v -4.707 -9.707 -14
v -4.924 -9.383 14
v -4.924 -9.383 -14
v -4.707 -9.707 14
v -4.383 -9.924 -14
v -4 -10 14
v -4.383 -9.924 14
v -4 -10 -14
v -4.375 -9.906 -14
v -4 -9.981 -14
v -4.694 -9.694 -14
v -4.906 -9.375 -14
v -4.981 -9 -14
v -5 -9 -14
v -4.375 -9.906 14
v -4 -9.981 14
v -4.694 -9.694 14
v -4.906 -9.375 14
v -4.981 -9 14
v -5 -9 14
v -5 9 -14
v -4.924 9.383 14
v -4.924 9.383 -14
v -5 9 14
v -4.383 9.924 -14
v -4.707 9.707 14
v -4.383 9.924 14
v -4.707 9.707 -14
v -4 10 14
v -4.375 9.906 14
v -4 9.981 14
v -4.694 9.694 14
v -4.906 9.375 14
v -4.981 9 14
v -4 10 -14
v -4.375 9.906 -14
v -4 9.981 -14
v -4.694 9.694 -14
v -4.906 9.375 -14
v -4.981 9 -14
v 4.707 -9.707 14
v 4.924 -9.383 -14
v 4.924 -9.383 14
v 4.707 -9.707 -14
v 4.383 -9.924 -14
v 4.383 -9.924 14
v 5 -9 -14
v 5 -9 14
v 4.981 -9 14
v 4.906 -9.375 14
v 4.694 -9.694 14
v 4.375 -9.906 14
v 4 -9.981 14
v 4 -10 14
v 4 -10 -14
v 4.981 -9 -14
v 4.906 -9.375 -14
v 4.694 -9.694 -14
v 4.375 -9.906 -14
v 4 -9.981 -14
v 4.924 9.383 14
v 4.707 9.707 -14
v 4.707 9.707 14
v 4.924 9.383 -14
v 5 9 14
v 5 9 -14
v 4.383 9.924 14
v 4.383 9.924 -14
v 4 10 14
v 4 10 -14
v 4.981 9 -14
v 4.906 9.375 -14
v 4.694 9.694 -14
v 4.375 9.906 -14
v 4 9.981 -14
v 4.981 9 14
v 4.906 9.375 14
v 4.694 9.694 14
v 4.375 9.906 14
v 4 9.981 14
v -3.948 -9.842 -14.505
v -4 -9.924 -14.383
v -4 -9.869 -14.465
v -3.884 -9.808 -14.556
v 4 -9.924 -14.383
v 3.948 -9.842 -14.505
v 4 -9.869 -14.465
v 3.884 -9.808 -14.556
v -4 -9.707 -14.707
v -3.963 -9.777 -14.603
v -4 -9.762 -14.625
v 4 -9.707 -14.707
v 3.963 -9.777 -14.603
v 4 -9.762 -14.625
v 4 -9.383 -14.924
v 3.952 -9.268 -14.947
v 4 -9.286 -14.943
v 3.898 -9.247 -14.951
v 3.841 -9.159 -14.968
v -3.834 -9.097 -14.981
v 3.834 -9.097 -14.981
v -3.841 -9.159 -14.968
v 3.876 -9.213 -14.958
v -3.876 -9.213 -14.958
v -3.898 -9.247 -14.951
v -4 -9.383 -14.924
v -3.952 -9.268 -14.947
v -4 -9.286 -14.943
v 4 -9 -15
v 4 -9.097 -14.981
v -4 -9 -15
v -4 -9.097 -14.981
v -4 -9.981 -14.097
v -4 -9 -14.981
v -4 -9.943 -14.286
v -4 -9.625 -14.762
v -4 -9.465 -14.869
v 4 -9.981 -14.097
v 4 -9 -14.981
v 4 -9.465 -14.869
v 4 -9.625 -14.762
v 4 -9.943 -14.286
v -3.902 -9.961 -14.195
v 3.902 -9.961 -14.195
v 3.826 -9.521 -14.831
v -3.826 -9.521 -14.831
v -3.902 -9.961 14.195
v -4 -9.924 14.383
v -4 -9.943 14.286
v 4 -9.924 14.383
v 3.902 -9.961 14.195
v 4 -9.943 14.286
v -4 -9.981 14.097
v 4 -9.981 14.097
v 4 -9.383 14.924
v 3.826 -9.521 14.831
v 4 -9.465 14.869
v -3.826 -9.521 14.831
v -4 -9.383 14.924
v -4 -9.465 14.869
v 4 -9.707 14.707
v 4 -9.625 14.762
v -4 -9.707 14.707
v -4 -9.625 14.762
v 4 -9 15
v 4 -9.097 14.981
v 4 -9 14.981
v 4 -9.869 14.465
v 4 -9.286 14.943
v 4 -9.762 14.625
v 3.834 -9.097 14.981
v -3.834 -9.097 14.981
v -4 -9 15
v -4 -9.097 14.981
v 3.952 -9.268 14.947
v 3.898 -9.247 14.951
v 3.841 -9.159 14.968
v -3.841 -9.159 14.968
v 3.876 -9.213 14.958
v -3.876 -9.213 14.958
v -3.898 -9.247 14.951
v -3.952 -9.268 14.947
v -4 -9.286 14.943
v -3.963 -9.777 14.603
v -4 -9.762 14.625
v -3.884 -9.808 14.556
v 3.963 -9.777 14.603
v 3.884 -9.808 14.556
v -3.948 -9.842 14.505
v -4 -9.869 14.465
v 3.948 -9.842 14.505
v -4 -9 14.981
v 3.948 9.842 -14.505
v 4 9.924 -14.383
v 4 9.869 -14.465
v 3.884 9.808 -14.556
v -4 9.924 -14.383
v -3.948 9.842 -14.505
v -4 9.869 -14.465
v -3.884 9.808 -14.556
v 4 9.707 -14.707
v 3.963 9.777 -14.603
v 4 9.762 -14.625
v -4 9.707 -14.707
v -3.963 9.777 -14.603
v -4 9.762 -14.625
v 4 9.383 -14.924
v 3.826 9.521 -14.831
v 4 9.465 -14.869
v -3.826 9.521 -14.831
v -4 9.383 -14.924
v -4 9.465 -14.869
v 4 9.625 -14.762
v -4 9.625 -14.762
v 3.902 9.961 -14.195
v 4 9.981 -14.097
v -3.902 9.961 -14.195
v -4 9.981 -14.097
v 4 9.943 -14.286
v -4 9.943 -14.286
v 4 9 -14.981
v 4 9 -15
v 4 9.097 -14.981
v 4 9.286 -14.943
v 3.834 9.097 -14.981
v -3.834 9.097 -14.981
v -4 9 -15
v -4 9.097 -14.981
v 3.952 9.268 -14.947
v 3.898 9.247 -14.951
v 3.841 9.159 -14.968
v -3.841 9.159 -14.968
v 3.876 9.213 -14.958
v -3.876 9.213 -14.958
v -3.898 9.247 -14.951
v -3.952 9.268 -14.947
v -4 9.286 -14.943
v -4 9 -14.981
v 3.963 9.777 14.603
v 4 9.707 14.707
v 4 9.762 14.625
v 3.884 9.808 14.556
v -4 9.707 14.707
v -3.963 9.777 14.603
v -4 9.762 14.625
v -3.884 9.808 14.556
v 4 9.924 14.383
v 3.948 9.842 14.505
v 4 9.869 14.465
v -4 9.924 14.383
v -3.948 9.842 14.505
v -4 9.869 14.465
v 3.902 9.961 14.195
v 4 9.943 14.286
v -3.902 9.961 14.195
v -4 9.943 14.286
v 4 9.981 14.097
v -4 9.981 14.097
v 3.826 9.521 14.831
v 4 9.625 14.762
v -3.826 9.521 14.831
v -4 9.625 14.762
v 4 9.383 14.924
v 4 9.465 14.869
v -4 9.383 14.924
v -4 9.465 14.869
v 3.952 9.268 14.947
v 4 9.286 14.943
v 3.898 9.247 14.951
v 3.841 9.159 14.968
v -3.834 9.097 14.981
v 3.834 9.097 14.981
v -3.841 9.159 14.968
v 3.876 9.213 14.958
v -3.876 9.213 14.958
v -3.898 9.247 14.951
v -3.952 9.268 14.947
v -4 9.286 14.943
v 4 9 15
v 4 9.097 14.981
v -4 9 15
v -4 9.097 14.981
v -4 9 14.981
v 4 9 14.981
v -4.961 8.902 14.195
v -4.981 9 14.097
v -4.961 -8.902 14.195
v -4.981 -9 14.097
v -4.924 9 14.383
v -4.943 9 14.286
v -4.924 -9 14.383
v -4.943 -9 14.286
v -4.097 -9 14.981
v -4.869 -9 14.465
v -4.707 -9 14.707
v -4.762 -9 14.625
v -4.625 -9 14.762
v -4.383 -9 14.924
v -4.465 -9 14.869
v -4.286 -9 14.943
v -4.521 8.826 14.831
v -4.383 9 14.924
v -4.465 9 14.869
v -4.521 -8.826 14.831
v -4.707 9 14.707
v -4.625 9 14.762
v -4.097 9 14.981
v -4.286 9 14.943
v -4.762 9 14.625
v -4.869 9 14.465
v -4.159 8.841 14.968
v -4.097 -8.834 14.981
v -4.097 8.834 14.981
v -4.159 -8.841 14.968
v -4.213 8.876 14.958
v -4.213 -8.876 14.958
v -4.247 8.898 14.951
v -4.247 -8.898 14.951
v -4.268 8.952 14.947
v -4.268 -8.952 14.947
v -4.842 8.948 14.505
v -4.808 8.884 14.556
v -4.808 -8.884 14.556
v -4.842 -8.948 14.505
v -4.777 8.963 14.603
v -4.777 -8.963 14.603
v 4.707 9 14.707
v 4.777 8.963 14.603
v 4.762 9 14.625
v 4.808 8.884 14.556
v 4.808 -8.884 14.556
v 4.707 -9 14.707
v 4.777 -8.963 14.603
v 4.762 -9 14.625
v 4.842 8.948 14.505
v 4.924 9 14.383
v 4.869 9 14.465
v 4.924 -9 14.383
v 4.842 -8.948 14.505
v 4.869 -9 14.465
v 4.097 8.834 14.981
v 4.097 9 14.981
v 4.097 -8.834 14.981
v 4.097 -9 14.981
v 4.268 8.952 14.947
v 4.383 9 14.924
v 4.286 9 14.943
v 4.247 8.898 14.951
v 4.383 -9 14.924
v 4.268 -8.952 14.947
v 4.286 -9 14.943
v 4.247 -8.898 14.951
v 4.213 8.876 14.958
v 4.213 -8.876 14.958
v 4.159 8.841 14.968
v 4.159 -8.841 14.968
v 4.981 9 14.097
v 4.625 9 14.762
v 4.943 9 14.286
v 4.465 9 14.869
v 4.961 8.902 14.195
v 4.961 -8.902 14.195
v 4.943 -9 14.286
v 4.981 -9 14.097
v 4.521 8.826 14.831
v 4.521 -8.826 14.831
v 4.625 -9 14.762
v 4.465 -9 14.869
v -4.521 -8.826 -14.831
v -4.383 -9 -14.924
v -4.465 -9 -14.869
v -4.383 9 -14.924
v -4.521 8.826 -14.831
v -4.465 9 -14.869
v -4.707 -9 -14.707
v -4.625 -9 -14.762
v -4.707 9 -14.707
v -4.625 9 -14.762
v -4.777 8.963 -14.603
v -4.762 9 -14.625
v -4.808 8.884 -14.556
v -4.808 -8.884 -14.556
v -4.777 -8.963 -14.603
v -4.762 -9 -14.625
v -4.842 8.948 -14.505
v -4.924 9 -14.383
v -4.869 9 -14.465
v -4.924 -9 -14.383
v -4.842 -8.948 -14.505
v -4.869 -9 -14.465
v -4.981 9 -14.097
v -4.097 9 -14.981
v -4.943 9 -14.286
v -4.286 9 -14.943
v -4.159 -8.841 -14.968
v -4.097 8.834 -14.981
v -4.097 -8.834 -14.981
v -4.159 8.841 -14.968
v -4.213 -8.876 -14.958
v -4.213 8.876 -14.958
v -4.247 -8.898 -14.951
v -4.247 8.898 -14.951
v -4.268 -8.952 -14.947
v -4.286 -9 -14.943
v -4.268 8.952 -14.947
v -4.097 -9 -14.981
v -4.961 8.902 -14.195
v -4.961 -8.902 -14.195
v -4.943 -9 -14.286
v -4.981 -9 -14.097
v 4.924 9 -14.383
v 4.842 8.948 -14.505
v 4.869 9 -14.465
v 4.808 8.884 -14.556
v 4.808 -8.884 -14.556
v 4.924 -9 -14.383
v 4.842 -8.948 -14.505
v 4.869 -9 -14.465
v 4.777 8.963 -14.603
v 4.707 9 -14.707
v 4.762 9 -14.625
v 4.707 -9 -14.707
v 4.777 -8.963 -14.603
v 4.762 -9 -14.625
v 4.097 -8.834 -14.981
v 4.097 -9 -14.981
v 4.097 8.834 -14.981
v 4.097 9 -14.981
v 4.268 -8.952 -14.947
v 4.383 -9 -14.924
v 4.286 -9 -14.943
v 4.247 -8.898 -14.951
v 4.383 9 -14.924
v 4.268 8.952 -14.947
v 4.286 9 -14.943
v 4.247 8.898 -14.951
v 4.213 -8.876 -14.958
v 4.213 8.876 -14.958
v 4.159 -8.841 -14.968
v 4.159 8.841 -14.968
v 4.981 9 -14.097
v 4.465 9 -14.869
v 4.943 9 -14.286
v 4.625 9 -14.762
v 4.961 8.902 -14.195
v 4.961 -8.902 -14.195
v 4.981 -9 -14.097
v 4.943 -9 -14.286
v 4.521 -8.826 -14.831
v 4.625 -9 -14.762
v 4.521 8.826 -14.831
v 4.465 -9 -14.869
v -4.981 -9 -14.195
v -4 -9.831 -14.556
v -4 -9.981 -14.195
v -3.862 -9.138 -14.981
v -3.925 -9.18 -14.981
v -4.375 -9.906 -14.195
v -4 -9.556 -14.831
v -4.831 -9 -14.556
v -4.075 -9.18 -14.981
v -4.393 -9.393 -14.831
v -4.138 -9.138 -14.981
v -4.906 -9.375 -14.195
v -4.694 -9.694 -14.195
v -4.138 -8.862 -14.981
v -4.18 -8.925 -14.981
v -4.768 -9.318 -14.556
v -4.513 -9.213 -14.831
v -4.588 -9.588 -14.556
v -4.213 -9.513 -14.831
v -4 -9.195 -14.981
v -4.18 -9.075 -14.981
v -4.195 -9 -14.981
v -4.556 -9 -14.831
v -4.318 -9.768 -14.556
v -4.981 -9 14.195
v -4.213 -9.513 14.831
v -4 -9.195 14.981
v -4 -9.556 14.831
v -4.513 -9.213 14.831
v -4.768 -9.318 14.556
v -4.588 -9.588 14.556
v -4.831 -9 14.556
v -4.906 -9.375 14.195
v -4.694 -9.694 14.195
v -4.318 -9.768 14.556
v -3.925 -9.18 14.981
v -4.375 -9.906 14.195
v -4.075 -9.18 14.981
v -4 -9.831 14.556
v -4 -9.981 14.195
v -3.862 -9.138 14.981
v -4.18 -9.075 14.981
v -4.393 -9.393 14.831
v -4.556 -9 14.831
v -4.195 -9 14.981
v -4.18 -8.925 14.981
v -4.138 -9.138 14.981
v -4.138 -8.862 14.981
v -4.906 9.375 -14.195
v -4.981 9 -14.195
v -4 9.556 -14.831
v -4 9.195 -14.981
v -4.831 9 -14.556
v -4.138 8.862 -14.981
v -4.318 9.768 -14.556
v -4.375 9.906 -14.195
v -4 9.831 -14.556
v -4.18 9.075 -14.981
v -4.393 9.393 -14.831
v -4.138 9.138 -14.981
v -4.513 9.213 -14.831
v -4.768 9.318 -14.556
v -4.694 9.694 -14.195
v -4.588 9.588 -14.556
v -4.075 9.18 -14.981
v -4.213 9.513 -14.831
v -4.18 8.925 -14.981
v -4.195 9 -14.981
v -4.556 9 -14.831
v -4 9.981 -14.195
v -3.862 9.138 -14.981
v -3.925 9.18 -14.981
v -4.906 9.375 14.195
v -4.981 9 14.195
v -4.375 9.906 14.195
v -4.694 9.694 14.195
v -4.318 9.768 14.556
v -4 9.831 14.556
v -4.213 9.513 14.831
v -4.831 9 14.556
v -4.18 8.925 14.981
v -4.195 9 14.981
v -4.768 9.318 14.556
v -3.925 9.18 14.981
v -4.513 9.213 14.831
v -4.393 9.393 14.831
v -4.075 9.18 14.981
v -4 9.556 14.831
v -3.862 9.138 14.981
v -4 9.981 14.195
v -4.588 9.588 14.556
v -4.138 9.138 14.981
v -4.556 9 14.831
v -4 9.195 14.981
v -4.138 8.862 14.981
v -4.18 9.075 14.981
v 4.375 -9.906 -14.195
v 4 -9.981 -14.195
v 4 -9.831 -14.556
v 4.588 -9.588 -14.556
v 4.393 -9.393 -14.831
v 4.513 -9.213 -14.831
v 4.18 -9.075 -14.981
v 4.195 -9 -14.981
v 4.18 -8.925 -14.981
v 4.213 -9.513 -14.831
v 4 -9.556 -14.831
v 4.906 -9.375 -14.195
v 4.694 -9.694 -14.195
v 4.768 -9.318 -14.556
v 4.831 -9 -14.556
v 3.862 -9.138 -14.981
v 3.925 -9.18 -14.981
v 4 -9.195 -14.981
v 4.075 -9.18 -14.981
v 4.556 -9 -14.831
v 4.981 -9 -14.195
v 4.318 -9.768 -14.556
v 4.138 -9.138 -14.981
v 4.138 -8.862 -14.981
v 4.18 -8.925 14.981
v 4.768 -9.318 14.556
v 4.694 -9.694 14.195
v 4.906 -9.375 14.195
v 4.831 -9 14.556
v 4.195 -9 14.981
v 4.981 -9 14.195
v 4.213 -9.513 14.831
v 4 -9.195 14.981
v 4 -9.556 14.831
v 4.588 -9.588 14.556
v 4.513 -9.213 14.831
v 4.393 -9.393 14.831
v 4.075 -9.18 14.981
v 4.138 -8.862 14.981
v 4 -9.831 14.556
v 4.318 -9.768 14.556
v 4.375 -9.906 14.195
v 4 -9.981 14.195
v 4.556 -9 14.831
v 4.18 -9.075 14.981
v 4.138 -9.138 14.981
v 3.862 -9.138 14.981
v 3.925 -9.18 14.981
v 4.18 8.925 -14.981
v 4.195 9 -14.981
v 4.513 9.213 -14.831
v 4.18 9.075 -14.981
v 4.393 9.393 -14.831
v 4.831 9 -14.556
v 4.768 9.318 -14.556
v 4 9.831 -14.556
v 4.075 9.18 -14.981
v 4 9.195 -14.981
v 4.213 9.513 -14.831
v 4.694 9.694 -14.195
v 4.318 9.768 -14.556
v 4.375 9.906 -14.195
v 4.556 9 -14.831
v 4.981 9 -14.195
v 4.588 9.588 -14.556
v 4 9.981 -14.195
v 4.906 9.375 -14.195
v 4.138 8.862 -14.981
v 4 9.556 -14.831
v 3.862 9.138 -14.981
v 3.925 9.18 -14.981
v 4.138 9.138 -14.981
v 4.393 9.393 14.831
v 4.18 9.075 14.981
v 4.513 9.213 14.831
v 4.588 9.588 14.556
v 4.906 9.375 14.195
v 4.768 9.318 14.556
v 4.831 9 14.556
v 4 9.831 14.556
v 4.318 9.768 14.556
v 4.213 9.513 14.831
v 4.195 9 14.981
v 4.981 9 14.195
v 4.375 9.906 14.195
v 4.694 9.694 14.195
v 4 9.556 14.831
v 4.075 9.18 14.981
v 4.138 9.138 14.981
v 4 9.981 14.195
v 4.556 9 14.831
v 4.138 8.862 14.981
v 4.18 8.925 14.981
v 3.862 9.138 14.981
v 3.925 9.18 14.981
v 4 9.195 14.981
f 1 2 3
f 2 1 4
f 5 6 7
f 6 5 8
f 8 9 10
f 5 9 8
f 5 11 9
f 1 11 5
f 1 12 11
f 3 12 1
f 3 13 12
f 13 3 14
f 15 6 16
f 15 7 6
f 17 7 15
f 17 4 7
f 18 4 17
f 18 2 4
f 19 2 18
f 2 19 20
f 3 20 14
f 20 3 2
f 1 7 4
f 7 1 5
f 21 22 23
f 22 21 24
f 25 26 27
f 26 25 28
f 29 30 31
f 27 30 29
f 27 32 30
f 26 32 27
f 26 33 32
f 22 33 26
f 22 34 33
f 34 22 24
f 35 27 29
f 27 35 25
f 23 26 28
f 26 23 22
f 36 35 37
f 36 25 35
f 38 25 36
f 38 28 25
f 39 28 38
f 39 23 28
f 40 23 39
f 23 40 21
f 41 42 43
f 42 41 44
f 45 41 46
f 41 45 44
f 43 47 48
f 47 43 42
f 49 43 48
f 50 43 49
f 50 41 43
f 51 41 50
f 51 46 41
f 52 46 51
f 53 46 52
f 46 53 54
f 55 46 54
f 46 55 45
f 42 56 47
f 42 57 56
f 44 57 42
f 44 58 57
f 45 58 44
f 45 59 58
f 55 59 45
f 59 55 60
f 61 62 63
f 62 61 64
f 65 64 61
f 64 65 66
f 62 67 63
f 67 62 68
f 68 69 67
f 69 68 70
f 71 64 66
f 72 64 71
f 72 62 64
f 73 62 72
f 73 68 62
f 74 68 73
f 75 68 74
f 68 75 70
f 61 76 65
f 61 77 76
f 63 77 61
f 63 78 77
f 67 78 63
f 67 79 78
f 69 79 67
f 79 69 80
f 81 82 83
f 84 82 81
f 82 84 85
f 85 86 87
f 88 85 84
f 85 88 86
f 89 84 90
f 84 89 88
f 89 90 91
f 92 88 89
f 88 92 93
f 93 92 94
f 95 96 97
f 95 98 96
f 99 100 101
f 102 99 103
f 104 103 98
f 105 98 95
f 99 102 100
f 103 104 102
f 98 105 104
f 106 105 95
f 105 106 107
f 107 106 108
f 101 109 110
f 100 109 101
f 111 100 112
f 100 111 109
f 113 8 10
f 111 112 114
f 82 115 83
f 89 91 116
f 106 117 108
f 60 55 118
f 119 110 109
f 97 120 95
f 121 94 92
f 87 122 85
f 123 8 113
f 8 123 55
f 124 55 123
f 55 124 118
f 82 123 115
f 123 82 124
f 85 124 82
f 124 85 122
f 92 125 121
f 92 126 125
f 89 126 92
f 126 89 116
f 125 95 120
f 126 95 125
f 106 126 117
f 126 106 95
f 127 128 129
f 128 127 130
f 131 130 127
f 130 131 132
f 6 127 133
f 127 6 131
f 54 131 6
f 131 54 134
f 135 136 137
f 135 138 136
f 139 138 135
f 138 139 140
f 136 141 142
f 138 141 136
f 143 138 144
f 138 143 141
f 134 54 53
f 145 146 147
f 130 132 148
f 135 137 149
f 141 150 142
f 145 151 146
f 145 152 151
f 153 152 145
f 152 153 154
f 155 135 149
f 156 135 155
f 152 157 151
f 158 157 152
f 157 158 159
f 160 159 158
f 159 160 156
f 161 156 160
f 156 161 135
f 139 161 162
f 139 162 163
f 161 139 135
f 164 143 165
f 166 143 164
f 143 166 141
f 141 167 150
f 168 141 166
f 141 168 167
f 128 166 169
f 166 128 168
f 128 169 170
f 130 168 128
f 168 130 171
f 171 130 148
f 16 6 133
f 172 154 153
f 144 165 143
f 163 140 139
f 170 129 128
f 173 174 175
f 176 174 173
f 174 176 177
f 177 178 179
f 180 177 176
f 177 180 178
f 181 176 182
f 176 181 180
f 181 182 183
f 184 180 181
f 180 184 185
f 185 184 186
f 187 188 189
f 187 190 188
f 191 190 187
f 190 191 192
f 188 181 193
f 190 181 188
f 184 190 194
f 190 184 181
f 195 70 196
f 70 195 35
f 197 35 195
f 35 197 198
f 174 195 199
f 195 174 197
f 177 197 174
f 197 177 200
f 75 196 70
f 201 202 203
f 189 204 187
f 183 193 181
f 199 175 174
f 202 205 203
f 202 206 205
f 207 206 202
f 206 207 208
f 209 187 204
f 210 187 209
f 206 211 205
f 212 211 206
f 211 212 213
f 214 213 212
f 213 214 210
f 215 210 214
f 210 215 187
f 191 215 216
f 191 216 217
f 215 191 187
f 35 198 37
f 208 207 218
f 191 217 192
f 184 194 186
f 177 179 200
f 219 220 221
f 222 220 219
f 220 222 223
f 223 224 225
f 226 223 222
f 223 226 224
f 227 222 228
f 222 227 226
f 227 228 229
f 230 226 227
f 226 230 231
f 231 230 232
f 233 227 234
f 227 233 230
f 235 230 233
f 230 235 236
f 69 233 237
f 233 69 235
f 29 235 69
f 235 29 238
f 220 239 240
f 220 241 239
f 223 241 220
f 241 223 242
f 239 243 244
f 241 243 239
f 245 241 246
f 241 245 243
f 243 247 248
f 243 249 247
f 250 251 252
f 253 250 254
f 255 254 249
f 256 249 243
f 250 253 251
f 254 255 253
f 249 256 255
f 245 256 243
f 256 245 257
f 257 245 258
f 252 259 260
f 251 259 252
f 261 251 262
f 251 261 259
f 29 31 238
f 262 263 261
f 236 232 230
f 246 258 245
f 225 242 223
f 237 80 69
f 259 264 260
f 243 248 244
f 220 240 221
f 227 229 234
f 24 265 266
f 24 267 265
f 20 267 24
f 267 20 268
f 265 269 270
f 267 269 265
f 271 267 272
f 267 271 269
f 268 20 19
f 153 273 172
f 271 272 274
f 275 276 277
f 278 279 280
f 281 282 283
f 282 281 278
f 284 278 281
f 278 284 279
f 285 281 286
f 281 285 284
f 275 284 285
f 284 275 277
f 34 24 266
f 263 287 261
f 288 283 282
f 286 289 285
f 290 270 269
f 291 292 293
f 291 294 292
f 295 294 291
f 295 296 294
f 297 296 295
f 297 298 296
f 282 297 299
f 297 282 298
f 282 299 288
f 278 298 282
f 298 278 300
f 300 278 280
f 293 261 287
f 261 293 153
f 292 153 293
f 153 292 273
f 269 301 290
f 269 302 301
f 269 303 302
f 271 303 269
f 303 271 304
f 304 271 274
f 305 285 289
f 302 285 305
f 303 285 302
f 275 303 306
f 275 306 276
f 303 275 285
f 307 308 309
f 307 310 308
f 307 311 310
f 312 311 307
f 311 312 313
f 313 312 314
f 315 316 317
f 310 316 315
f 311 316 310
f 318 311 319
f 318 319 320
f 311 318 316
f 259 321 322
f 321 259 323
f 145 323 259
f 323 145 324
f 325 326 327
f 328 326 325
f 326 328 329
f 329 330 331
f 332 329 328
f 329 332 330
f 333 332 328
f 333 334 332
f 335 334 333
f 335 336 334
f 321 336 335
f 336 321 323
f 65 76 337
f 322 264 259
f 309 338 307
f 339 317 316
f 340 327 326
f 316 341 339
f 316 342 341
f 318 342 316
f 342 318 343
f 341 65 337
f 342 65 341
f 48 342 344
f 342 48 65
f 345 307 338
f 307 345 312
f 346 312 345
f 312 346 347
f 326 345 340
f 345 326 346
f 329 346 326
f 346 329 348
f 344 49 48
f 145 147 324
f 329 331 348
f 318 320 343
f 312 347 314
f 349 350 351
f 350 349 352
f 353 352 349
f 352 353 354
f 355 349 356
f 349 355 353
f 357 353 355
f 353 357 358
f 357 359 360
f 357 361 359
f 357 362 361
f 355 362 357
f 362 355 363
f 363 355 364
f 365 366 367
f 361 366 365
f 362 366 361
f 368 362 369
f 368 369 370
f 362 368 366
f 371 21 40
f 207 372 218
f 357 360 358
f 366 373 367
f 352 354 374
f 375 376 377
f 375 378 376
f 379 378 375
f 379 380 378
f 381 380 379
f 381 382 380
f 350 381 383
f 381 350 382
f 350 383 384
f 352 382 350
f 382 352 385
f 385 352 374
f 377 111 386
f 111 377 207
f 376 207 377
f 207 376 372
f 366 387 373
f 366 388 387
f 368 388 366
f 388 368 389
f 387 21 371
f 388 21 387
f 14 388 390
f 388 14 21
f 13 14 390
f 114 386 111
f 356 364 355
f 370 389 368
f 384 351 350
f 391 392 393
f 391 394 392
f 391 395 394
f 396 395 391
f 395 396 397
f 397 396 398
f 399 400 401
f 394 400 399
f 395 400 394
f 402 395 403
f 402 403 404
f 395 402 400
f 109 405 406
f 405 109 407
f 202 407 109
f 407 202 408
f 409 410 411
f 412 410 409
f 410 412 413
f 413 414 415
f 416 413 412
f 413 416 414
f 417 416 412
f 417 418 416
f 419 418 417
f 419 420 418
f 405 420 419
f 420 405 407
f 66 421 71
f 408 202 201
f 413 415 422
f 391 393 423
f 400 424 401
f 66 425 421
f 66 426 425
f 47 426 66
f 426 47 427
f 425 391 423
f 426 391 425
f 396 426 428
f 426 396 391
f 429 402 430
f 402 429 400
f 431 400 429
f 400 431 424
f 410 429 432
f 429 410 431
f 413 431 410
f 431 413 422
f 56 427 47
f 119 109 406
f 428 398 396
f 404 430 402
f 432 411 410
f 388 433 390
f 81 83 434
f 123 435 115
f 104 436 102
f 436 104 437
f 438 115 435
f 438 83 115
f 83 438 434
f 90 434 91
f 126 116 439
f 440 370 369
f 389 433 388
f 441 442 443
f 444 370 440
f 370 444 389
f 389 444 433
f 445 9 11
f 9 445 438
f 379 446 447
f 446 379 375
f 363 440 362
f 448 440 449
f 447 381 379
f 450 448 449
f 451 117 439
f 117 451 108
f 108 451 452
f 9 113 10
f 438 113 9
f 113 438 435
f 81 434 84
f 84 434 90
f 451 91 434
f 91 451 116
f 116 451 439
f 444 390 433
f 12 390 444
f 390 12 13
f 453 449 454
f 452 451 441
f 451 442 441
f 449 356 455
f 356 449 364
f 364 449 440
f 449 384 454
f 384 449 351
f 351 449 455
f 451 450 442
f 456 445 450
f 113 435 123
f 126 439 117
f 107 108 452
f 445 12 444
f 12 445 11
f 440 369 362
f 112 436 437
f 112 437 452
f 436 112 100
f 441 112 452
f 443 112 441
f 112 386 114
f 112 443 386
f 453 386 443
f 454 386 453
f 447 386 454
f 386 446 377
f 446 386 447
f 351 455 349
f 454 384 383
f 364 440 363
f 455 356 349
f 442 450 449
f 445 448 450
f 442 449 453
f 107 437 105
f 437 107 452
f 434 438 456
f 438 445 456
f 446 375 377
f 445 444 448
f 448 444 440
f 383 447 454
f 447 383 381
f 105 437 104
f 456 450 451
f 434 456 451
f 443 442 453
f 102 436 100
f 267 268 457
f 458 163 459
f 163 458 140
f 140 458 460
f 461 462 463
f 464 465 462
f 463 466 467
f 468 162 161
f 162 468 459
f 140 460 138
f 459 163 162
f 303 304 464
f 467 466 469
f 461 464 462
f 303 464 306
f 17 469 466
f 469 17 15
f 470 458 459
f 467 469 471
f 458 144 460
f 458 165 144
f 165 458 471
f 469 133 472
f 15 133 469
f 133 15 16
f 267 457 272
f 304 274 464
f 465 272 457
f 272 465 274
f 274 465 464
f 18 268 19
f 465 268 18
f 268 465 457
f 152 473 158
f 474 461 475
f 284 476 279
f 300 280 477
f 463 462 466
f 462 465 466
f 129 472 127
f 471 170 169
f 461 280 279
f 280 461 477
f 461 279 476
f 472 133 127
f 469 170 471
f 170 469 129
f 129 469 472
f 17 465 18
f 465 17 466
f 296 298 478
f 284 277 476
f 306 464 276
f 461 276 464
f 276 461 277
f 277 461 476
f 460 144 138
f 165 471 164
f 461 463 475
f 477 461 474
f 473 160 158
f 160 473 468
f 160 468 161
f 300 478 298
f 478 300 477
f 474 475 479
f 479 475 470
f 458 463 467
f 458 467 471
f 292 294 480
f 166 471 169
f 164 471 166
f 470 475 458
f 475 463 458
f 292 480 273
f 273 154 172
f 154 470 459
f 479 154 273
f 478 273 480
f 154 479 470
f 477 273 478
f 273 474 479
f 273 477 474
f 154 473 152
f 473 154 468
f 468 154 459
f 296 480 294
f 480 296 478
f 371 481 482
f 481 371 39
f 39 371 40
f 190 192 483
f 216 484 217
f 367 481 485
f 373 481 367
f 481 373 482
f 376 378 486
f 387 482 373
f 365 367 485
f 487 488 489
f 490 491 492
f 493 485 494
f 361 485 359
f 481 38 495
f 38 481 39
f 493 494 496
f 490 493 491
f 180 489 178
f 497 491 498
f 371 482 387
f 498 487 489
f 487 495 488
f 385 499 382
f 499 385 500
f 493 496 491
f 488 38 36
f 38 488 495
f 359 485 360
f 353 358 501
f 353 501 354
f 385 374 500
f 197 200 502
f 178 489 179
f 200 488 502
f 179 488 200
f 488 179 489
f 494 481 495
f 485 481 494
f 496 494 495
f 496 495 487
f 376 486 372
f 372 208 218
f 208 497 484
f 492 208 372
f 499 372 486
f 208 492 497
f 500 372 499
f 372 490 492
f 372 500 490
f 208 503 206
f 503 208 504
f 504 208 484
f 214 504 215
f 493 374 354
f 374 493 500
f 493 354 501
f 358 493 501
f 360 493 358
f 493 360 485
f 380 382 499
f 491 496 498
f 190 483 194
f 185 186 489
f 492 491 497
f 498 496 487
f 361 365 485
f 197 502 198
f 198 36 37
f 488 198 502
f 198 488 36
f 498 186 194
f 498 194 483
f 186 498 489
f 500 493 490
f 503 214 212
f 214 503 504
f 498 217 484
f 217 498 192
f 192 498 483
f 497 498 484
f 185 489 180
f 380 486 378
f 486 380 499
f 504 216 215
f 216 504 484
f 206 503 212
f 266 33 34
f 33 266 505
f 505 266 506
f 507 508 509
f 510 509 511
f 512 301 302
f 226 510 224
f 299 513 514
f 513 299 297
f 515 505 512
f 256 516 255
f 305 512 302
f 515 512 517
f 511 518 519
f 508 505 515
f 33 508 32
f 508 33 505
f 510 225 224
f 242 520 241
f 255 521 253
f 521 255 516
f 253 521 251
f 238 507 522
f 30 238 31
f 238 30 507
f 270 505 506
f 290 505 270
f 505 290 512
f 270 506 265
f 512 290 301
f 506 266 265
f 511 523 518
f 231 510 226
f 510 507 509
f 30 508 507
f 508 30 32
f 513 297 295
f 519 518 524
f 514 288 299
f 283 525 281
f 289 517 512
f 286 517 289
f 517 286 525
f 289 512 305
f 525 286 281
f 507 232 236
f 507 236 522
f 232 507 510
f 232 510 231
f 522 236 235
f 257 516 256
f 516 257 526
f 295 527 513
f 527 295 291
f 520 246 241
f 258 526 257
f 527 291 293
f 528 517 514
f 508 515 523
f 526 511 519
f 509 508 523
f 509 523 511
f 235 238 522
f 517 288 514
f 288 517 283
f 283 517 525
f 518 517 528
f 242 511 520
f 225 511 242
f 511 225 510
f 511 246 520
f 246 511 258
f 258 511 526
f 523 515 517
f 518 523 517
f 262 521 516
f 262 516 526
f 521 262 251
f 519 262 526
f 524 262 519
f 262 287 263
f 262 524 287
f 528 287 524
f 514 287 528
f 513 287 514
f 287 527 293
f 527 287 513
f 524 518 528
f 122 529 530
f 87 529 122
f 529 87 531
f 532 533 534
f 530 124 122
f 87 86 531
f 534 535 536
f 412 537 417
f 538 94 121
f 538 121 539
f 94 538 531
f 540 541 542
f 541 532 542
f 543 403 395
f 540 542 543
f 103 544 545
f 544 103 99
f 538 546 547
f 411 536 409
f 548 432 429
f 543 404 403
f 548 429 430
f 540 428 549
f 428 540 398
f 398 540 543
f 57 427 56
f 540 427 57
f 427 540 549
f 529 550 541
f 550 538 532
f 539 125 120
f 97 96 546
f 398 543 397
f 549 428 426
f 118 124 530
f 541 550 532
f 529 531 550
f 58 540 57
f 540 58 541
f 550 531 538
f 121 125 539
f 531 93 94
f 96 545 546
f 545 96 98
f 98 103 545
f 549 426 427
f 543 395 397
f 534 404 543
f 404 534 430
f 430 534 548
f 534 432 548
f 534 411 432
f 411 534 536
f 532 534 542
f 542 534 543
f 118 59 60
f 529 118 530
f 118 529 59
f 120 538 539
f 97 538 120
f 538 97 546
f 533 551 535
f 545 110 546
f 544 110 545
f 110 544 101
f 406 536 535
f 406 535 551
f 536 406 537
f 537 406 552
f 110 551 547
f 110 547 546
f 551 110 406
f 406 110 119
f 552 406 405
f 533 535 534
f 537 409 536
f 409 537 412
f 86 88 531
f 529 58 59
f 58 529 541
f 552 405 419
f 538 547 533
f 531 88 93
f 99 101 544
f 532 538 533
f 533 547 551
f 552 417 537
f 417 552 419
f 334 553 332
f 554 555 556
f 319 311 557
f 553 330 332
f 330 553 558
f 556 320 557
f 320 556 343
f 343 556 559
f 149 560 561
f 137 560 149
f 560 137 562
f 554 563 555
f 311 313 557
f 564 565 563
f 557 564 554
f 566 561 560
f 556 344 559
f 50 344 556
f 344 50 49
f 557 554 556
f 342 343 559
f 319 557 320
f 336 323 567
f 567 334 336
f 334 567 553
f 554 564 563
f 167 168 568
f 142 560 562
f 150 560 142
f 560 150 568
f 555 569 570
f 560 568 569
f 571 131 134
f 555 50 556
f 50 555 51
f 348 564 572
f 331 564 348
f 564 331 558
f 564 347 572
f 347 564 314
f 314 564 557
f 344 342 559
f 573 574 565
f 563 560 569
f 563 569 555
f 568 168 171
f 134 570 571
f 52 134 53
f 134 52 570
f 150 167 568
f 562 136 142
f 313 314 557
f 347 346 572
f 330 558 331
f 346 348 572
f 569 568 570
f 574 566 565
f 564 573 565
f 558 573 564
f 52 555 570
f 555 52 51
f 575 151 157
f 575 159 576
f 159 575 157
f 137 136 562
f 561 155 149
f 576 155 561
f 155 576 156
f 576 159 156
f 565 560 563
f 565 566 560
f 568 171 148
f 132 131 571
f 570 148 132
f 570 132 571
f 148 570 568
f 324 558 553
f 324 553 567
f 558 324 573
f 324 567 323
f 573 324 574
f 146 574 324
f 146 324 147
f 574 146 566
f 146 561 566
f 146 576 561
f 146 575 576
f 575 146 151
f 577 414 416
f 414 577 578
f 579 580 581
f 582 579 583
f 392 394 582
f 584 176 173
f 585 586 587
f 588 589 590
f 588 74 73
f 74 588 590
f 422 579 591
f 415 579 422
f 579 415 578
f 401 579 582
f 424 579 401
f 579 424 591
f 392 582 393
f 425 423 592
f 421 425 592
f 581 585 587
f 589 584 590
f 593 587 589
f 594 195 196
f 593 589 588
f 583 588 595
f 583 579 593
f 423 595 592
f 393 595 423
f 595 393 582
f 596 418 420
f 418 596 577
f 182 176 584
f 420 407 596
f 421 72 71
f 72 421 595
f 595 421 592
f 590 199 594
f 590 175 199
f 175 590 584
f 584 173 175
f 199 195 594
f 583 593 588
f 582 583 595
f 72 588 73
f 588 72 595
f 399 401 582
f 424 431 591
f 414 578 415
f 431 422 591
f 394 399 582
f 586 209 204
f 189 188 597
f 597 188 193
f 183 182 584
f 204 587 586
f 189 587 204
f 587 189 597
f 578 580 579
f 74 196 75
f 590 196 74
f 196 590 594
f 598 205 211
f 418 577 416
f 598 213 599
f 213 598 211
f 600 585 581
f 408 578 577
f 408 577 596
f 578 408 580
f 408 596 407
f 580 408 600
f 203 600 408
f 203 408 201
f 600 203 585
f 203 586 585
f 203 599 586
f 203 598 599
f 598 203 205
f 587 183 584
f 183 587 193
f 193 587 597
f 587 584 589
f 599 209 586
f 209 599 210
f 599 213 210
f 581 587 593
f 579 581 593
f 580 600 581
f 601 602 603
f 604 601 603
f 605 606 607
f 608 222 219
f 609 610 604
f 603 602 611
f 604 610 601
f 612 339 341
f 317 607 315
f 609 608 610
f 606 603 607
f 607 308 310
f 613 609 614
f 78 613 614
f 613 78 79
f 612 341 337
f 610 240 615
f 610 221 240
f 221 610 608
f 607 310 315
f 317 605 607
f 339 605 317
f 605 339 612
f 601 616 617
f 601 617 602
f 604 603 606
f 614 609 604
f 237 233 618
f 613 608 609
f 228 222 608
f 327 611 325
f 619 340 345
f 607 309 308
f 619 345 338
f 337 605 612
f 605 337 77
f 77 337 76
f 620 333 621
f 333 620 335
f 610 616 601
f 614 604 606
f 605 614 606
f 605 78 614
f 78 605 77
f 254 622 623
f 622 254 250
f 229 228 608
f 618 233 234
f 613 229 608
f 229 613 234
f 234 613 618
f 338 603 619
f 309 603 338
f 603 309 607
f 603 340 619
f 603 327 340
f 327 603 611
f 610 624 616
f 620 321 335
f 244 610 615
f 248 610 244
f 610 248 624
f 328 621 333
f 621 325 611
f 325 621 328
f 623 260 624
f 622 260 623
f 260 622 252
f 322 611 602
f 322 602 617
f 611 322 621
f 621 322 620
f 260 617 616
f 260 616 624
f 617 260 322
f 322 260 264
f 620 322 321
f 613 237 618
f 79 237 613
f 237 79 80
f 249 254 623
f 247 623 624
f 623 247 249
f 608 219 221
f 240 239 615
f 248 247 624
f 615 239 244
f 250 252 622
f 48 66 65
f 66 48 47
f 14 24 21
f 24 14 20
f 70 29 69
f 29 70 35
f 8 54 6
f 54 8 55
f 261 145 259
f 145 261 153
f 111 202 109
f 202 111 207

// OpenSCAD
use <MCAD/boxes.scad>
$fa=1;
$fs=0.4;
//$fn=100;
roundedBox(size=[10,20,30],radius=1);
